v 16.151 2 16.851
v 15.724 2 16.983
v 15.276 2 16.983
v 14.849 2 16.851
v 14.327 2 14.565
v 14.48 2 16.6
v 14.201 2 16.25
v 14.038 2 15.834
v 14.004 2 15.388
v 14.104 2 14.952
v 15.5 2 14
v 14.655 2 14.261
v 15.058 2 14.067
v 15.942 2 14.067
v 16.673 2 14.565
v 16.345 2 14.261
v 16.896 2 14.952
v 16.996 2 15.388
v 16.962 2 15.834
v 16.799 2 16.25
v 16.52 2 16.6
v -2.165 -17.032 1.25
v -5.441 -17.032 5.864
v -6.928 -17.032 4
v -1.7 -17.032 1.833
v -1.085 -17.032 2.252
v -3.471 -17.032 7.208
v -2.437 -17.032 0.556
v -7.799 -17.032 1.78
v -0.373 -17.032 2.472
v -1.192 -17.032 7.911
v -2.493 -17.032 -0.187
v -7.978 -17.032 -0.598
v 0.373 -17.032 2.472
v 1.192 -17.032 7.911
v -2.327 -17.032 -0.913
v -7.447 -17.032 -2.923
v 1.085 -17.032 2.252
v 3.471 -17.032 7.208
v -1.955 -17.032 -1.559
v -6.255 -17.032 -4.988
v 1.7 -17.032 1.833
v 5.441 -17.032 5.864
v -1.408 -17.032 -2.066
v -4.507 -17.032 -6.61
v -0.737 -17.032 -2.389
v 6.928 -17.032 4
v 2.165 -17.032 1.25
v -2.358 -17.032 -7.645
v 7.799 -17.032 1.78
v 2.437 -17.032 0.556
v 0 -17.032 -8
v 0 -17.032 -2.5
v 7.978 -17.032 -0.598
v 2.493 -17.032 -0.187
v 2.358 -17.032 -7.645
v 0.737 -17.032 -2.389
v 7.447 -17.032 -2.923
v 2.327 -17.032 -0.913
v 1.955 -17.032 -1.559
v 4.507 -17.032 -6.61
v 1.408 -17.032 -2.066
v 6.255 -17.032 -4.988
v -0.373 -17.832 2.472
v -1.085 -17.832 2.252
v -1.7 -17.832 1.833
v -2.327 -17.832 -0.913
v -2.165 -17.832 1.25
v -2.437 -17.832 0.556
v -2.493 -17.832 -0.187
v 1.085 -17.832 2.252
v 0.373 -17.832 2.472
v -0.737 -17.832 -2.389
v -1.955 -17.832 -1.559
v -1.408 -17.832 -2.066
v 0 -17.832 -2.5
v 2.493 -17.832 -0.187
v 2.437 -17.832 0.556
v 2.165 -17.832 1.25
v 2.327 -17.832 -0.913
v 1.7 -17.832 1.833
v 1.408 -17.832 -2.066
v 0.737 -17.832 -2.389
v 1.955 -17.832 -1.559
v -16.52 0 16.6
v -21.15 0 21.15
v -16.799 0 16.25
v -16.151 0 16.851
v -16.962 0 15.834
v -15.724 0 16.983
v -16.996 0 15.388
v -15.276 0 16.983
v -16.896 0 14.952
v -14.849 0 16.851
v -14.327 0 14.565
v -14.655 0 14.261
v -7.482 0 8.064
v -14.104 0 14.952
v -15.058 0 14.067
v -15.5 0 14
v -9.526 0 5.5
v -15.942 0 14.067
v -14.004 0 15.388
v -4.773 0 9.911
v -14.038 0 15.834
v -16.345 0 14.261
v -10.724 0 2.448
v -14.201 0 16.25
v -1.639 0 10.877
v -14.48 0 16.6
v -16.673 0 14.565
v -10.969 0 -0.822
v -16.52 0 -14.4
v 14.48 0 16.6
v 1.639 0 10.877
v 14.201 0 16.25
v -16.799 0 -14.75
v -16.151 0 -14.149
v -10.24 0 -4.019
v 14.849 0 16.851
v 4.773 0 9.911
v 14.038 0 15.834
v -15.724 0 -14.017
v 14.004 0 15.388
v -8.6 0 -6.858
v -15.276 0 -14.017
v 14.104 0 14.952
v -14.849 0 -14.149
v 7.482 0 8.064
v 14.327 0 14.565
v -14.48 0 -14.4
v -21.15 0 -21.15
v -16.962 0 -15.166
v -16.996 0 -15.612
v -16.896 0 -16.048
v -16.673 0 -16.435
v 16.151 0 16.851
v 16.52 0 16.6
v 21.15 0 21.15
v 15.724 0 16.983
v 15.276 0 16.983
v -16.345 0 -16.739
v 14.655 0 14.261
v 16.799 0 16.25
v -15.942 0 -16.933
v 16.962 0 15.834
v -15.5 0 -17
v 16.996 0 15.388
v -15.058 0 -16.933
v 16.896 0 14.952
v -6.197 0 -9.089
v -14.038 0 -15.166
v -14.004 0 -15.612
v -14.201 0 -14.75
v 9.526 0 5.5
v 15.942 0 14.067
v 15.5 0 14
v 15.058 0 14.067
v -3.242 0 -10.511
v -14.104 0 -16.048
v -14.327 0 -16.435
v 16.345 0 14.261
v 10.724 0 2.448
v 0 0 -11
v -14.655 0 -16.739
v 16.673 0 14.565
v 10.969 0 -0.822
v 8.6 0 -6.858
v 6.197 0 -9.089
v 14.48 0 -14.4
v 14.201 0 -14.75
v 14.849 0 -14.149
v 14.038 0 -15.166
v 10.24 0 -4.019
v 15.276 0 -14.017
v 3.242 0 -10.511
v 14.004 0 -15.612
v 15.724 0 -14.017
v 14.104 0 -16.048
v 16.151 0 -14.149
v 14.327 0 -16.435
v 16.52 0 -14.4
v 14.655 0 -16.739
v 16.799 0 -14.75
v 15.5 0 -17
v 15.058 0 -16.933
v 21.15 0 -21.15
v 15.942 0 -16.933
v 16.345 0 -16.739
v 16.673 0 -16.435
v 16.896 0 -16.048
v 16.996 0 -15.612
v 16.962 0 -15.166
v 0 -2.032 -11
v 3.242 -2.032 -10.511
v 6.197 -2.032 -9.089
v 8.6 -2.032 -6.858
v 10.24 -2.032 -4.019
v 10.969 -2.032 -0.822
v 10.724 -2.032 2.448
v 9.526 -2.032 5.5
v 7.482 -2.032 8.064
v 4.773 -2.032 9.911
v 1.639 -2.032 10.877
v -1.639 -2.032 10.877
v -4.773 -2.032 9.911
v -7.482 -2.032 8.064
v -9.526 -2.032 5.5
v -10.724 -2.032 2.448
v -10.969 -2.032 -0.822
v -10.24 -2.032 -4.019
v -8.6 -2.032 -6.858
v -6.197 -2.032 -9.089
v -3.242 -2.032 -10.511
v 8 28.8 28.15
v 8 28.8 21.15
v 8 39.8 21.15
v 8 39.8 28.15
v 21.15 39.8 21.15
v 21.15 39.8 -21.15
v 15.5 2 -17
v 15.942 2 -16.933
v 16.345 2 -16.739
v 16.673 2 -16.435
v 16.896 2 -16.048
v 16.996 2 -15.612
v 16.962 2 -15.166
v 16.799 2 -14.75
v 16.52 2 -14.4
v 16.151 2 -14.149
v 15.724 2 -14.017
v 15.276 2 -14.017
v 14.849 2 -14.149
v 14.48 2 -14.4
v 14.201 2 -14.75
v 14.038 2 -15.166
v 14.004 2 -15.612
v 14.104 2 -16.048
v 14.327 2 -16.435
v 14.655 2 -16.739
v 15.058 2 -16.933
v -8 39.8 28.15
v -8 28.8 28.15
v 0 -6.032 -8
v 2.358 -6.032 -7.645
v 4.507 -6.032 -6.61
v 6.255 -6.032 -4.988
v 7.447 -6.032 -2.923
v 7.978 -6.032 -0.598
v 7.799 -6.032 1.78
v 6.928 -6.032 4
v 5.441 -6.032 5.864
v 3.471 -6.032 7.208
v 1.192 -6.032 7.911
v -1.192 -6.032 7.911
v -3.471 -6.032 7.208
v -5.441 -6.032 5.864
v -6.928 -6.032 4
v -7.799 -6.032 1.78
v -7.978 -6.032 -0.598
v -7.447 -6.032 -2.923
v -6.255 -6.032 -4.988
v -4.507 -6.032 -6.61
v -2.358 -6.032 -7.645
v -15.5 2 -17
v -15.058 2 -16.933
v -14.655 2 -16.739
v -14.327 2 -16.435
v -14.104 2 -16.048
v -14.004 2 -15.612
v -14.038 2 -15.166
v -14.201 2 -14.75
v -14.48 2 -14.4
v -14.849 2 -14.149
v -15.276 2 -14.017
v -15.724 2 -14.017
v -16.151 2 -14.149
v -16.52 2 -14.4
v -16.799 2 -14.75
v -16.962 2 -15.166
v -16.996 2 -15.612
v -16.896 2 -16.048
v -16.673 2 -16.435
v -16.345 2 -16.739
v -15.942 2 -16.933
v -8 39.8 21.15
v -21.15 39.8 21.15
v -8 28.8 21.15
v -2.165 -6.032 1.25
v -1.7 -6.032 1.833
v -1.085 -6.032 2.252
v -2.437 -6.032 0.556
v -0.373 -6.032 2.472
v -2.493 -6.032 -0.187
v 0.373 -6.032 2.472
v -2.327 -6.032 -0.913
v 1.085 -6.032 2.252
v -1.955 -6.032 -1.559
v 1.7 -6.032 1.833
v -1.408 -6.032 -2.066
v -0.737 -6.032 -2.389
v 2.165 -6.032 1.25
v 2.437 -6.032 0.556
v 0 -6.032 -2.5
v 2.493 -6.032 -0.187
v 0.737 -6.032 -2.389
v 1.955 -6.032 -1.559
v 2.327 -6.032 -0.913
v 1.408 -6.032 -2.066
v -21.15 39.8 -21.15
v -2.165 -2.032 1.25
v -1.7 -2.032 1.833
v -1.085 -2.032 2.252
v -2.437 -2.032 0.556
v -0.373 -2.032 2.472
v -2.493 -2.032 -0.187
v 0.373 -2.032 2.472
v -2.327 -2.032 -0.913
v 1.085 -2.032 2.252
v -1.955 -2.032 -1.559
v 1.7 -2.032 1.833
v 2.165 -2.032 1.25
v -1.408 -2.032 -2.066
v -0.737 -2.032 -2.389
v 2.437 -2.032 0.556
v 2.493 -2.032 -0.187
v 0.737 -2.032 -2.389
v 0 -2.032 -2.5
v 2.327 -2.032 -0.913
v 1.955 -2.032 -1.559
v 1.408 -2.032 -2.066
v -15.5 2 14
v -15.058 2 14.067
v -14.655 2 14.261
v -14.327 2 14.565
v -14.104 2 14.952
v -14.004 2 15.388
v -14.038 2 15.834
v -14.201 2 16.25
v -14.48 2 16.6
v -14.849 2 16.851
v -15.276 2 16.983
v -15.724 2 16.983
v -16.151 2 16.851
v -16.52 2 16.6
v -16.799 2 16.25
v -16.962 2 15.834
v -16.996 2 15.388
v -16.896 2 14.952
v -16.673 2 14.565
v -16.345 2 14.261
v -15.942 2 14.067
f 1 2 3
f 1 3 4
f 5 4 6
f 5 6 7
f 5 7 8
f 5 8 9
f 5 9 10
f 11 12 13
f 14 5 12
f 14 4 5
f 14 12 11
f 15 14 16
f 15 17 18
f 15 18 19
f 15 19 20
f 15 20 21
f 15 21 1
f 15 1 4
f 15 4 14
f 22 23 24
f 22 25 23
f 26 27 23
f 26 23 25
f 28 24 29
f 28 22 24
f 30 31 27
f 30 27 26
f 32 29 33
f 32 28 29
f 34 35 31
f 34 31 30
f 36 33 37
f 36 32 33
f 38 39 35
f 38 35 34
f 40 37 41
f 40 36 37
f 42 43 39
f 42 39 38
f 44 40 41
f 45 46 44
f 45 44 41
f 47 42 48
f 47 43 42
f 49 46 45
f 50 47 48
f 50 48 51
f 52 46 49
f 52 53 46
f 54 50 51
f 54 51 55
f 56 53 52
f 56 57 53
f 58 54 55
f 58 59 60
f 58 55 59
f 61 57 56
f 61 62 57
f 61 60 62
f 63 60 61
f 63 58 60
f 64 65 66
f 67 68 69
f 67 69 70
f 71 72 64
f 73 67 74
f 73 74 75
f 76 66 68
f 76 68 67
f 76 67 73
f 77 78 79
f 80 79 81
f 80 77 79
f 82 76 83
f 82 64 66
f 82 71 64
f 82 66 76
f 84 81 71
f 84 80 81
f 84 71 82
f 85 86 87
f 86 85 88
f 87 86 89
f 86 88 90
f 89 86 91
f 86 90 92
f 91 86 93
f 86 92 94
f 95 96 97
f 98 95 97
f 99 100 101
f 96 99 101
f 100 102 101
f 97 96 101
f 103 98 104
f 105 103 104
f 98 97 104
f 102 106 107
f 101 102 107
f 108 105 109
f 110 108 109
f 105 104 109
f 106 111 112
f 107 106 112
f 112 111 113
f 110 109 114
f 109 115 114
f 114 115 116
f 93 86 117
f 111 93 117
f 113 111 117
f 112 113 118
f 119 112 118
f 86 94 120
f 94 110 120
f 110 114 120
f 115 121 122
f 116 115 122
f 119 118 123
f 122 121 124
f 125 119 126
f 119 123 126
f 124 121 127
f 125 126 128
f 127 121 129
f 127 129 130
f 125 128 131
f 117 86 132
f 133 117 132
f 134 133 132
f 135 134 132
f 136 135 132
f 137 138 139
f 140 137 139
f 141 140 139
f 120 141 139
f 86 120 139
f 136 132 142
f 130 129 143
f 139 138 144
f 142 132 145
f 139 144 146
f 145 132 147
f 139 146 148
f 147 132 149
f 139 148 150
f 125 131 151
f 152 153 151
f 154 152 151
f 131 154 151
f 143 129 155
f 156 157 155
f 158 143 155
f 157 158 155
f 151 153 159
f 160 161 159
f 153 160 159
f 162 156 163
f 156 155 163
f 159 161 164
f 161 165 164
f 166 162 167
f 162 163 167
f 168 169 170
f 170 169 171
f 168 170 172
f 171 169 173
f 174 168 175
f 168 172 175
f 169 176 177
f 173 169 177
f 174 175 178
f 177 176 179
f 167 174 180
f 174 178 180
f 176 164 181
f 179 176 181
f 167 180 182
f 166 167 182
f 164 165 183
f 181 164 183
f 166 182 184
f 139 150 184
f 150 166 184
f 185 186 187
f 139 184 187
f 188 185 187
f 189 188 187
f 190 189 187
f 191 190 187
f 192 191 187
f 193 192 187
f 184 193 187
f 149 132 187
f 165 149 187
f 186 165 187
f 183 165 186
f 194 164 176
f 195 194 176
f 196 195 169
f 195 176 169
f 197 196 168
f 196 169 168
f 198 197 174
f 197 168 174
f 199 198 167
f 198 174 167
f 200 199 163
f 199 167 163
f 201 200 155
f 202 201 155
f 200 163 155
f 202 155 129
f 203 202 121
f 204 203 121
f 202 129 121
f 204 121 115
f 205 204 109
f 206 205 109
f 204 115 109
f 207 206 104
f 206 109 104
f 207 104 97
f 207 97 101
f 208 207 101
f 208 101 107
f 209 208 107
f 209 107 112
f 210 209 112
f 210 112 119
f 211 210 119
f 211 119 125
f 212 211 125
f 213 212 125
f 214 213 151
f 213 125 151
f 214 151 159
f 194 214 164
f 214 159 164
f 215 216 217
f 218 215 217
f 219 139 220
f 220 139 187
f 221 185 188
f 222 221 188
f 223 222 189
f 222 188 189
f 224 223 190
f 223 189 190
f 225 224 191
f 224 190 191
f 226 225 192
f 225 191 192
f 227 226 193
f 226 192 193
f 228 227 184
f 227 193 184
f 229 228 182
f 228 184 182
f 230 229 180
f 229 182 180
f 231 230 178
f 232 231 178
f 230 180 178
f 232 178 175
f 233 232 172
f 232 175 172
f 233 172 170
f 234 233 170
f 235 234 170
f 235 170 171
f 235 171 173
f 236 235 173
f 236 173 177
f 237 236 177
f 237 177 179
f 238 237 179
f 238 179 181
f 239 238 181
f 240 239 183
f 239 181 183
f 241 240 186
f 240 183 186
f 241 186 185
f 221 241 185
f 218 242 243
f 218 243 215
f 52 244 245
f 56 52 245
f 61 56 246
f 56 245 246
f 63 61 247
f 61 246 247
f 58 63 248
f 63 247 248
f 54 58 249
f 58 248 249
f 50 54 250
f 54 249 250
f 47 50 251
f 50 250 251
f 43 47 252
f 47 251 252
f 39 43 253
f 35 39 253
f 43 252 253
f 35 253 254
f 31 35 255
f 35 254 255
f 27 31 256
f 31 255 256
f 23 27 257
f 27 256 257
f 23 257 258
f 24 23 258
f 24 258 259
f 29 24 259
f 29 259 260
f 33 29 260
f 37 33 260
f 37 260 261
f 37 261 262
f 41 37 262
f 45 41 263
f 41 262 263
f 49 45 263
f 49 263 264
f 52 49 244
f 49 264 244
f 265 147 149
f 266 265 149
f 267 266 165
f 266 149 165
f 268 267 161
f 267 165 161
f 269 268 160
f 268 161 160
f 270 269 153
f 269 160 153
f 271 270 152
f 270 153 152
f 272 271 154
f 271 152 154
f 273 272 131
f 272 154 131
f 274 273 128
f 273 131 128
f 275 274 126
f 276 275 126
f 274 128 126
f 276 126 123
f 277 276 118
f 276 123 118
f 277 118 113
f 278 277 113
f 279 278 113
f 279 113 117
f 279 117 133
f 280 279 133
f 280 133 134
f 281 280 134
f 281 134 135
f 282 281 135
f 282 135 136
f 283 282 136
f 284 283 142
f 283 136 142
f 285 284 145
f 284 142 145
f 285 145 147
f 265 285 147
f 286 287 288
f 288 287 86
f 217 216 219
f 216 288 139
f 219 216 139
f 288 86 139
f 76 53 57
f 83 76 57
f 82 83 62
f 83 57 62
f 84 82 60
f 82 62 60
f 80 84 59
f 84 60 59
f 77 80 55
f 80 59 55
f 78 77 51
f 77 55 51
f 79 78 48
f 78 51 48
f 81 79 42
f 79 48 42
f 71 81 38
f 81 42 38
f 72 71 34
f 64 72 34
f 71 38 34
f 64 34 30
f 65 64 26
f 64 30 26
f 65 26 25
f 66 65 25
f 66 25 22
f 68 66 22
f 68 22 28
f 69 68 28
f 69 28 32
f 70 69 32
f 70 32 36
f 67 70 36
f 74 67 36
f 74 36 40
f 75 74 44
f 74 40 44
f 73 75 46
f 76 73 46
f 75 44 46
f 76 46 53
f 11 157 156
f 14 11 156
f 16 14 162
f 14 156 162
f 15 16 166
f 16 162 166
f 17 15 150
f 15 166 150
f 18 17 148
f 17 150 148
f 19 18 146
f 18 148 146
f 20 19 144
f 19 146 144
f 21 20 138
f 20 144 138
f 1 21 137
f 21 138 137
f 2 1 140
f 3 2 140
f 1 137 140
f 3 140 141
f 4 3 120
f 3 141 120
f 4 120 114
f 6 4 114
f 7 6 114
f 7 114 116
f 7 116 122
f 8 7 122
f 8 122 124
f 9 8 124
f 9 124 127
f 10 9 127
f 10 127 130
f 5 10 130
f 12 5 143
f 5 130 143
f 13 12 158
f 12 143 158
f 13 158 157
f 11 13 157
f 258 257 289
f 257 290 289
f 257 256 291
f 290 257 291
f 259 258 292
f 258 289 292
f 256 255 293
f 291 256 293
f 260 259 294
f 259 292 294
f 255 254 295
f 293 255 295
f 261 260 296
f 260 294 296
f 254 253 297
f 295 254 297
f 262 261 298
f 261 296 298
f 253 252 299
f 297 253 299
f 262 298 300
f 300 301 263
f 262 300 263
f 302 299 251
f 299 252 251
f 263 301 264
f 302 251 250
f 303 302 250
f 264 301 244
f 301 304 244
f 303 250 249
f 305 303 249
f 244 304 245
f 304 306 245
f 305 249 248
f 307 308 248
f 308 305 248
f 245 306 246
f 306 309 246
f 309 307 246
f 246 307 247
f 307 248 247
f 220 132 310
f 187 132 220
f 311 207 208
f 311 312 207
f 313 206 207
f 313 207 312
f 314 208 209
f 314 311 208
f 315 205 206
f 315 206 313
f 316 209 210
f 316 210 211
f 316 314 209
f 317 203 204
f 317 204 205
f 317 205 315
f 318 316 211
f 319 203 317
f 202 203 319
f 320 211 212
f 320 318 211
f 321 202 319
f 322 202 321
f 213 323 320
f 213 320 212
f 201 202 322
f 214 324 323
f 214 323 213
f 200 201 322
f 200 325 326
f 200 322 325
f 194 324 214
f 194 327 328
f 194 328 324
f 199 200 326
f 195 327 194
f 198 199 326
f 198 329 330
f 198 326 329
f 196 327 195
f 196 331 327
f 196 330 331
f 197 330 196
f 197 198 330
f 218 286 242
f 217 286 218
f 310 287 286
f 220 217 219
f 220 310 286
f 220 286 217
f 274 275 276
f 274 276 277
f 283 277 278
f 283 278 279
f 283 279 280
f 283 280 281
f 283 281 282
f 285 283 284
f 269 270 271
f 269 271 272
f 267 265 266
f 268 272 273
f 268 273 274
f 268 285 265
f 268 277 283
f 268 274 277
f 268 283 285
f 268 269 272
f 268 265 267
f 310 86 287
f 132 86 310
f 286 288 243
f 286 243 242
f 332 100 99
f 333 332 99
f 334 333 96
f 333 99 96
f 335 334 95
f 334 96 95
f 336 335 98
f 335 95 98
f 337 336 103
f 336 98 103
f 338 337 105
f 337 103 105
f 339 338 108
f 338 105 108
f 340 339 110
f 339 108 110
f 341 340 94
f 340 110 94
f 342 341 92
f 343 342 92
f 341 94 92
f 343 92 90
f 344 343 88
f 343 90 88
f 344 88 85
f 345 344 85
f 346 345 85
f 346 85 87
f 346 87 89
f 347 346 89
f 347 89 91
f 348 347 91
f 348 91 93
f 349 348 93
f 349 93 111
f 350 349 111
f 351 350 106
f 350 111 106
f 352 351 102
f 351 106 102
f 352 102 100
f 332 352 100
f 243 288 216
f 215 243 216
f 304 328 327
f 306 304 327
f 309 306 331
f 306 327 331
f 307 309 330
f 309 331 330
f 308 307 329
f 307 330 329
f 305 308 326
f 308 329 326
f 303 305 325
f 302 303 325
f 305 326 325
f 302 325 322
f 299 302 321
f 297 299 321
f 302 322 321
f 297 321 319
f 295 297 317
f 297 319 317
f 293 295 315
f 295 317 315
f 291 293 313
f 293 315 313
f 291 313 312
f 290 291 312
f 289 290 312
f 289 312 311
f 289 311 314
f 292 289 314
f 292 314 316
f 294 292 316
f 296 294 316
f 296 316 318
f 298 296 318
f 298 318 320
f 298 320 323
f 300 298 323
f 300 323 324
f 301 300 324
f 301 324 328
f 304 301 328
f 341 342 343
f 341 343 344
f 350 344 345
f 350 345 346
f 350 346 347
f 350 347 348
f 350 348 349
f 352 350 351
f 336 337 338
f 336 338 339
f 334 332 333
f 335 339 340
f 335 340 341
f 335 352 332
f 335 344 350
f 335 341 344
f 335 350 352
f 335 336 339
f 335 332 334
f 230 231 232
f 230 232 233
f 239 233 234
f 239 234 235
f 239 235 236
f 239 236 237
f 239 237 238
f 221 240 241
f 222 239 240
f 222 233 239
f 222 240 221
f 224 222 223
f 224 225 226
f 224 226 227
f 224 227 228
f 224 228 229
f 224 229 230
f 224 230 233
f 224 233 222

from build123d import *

# Parameters (mm, degrees)
SKETCH2_W           = 42.3
SKETCH2_H           = 42.3
BOSS_EXTRUDE2_DEPTH = 39.8
SKETCH4_R           = 11
BOSS_EXTRUDE3_DEPTH = 2.032
SKETCH6_R           = 1.5
CUT_EXTRUDE1_DEPTH  = 2
SKETCH7_W           = 16
SKETCH7_H           = 11
BOSS_EXTRUDE4_DEPTH = 7
SKETCH9_R           = 2.5
BOSS_EXTRUDE5_DEPTH = 15
BOSS_EXTRUDE7_START = -11
SKETCH11_R          = 8
SKETCH11_R_2        = 2.5
BOSS_EXTRUDE7_DEPTH = 11
SKETCH13_R          = 2.5
BOSS_EXTRUDE8_DEPTH = 0.8


with BuildPart() as part:
    # Sketch2 → Boss-Extrude2 (new body)
    with BuildSketch(Plane(origin=(0, 0, 0), x_dir=(1, 0, 0), z_dir=(0, 1, 0))):
        Rectangle(SKETCH2_W, SKETCH2_H)
    extrude(amount=BOSS_EXTRUDE2_DEPTH)

    # Sketch4 → Boss-Extrude3 (add)
    with BuildSketch(Plane.XZ):
        Circle(SKETCH4_R)
    extrude(amount=BOSS_EXTRUDE3_DEPTH)

    # Sketch6 → Cut-Extrude1 (cut)
    with BuildSketch(Plane.XZ):
        with Locations((15.5, 15.5)):
            Circle(SKETCH6_R)
        with Locations((-15.5, 15.5)):
            Circle(SKETCH6_R)
        with Locations((-15.5, -15.5)):
            Circle(SKETCH6_R)
        with Locations((15.5, -15.5)):
            Circle(SKETCH6_R)
    extrude(amount=-CUT_EXTRUDE1_DEPTH, mode=Mode.SUBTRACT)

    # Sketch7 → Boss-Extrude4 (add)
    with BuildSketch(Plane.XY.offset(21.15)):
        with Locations((0, 34.3)):
            Rectangle(SKETCH7_W, SKETCH7_H)
    extrude(amount=BOSS_EXTRUDE4_DEPTH)

    # Sketch9 → Boss-Extrude5 (add)
    with BuildSketch(Plane.XZ.offset(2.032)):
        Circle(SKETCH9_R)
    extrude(amount=BOSS_EXTRUDE5_DEPTH)

    # Sketch11 → Boss-Extrude7 (add)
    with BuildSketch(Plane.XZ.offset(17.032).offset(BOSS_EXTRUDE7_START)):
        Circle(SKETCH11_R)
        Circle(SKETCH11_R_2, mode=Mode.SUBTRACT)
    extrude(amount=BOSS_EXTRUDE7_DEPTH)

    # Sketch13 → Boss-Extrude8 (add)
    with BuildSketch(Plane.XZ.offset(17.032)):
        Circle(SKETCH13_R)
    extrude(amount=BOSS_EXTRUDE8_DEPTH)


solid = part.part
